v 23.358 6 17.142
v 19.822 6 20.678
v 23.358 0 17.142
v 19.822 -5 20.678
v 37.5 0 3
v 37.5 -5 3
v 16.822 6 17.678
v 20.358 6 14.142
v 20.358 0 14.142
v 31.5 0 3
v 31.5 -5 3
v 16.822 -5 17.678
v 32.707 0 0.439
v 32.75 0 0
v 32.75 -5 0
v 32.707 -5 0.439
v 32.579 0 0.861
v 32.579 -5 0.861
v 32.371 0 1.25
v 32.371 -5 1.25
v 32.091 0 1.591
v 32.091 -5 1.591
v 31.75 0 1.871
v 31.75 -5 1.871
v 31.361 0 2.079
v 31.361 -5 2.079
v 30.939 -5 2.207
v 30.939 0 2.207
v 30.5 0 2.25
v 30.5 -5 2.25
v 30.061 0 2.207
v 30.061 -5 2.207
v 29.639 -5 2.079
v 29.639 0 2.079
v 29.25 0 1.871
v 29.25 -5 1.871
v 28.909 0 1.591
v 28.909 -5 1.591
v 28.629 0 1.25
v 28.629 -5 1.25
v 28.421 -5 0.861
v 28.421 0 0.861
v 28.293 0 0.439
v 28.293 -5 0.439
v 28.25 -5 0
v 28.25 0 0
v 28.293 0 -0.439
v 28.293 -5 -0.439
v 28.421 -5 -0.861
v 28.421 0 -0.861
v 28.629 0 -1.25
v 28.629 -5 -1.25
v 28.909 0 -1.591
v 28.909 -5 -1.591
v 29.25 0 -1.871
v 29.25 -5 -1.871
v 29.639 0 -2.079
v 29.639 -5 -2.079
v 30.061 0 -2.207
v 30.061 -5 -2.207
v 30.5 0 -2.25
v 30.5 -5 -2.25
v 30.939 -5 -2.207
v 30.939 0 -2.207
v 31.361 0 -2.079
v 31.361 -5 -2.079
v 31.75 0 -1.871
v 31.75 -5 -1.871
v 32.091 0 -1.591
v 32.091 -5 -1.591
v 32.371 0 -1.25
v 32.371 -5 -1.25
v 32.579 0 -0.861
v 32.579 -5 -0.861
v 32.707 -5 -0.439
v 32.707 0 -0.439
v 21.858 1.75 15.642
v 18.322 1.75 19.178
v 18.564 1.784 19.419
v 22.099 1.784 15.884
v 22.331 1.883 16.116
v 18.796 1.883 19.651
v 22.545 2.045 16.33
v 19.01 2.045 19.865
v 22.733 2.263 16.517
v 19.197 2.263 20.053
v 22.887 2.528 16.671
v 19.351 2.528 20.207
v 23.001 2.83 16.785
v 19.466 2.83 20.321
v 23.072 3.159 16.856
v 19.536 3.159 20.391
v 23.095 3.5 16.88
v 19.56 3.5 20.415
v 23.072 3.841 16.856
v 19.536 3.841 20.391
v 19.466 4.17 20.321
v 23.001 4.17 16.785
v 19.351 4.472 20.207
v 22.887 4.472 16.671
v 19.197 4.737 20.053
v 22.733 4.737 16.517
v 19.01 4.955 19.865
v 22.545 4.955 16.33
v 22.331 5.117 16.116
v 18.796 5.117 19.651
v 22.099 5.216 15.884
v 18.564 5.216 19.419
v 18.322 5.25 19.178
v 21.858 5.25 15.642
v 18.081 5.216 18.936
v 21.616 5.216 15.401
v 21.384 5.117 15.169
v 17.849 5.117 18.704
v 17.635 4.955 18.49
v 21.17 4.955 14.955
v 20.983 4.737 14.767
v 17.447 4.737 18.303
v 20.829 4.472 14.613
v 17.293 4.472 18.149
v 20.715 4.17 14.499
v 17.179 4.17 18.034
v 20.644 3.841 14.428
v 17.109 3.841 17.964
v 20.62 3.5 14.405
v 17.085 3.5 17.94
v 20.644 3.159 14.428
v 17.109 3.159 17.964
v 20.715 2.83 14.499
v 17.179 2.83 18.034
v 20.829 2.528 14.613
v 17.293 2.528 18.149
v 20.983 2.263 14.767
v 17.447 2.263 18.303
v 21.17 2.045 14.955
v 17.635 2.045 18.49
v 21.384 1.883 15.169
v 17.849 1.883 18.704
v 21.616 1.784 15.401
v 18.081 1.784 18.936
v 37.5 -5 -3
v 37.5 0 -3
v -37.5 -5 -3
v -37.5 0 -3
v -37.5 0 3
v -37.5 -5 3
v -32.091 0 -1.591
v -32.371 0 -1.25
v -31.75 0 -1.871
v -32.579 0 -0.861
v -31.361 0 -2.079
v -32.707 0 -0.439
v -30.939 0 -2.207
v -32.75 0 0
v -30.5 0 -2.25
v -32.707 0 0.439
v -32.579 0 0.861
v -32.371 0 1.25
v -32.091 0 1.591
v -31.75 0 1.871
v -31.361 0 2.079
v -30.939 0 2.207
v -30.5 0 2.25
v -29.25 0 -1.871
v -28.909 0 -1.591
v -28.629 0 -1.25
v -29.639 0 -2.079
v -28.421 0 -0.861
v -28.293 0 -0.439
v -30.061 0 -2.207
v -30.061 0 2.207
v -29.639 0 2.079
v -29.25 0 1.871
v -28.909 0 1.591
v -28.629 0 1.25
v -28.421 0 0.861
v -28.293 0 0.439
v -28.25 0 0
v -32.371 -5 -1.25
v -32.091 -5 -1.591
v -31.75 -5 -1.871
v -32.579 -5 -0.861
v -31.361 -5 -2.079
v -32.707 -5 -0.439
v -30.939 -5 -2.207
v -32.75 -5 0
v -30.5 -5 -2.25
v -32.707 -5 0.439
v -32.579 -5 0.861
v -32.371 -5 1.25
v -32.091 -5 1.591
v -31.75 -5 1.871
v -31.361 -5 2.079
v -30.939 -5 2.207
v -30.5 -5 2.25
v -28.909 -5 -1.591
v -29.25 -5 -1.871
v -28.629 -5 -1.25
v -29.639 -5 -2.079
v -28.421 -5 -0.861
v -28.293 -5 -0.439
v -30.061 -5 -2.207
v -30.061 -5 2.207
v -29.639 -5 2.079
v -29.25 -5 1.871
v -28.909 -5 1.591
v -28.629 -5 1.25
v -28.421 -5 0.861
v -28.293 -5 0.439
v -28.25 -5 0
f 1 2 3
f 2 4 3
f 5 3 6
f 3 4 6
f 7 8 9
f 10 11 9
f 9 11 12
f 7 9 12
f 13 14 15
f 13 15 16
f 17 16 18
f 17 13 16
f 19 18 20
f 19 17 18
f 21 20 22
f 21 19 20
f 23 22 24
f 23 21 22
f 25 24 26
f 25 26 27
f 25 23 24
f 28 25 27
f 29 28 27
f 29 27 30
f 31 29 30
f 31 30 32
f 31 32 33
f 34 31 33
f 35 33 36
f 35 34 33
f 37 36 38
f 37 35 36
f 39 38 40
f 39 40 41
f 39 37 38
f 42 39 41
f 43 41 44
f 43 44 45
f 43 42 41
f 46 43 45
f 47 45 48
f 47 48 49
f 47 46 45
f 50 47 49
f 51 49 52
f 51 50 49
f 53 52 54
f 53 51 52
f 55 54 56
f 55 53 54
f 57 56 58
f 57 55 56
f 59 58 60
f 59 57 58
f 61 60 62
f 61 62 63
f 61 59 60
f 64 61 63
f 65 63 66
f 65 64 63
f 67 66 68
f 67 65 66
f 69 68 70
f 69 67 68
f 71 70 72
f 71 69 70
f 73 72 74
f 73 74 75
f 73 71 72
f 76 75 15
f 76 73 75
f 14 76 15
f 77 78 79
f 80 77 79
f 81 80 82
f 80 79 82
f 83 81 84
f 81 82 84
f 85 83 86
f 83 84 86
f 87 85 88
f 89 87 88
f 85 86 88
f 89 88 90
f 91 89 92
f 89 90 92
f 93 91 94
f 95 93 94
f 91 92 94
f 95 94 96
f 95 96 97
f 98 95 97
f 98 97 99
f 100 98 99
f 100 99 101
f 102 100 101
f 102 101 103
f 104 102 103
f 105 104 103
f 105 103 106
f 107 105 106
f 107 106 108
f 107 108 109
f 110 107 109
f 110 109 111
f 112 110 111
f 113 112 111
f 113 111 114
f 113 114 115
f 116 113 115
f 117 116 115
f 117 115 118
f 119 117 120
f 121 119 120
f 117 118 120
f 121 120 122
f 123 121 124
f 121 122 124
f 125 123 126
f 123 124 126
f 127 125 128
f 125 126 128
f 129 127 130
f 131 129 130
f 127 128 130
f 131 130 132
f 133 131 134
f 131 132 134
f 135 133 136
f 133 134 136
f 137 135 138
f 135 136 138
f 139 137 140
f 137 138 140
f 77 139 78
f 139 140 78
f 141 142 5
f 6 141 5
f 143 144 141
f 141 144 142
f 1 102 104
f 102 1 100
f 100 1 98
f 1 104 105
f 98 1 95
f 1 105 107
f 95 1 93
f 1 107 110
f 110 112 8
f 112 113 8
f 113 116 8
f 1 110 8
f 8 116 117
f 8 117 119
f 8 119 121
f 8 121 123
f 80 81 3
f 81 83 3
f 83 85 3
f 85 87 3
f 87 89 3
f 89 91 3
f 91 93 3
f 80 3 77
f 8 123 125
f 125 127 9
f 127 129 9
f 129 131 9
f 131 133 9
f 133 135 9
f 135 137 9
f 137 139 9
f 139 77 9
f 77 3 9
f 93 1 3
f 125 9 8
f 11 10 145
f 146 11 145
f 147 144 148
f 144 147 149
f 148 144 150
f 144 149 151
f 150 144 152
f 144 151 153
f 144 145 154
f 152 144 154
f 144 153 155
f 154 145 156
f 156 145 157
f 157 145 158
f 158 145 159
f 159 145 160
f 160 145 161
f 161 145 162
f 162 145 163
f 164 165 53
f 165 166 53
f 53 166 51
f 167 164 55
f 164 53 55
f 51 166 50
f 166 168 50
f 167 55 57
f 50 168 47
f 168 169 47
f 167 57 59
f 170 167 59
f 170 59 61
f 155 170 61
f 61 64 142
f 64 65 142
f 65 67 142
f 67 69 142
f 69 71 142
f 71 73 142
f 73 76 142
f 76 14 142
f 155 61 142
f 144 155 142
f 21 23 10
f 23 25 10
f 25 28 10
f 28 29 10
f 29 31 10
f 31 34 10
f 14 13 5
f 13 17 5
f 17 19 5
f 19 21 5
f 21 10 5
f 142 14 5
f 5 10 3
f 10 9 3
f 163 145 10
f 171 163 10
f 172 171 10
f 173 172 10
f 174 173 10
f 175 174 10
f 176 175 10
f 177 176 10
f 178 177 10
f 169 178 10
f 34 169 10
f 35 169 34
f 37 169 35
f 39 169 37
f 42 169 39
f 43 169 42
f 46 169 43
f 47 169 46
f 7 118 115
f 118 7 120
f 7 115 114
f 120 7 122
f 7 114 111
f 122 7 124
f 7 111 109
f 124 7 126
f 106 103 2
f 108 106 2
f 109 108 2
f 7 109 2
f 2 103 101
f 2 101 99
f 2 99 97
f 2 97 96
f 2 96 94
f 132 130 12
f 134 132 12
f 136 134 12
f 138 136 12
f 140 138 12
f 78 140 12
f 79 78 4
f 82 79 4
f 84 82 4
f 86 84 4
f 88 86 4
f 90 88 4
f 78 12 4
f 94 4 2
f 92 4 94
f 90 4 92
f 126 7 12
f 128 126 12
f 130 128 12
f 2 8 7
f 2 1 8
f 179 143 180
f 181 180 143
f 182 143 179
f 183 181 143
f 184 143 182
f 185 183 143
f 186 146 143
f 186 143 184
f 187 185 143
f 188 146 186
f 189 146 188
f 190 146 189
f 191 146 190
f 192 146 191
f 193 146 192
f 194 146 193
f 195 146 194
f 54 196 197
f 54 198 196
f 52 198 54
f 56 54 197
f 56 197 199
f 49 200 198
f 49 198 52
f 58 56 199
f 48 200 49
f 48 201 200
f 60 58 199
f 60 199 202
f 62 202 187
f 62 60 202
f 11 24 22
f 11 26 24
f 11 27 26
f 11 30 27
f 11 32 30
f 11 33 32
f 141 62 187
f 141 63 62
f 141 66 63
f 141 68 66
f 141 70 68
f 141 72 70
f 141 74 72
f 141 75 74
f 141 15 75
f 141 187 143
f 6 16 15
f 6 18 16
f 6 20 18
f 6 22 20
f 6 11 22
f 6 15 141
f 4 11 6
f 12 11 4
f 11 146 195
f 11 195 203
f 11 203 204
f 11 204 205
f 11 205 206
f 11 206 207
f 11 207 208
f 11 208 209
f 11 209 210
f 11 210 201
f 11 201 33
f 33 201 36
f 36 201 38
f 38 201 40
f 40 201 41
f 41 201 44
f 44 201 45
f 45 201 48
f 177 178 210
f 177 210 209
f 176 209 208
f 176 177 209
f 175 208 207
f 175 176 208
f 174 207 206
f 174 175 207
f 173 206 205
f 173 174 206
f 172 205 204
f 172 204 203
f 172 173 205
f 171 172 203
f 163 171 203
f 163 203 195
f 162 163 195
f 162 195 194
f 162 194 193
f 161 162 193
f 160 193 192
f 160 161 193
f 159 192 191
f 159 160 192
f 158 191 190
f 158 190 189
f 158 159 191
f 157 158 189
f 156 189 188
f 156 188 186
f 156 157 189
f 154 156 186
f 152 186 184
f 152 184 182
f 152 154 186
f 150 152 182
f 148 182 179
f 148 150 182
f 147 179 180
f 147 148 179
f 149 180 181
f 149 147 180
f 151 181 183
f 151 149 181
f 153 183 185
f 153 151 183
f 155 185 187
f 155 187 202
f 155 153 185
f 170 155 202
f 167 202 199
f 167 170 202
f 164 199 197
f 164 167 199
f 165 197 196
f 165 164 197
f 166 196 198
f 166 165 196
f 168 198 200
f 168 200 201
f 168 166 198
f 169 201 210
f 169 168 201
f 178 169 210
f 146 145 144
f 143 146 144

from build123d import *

# Parameters (mm, degrees)
F0_R     = 2.25
F1_DEPTH = 5
F3_DEPTH = 6
F4_R     = 1.75
F5_DEPTH = 29.243641


with BuildPart() as f1:
    # F0 (on Front) → F1 (new body)
    with BuildSketch(Plane.XZ):
        Polygon((37.5, -3), (37.5, 3), (31.5, 3), align=None)
        Polygon((31.5, 3), (37.5, 3), (19.82233, 20.67767), (16.82233, 17.67767), align=None)
        Polygon((37.5, -3), (31.5, 3), (-37.5, 3), (-37.5, -3), align=None)
        with Locations((-30.5, 0)):
            Circle(F0_R, mode=Mode.SUBTRACT)
        with Locations((30.5, 0)):
            Circle(F0_R, mode=Mode.SUBTRACT)
    extrude(amount=F1_DEPTH)

    # F2 (on face) → F3 (join)
    with BuildSketch(Plane(origin=(0, 0, 0), x_dir=(-1, 0, 0), z_dir=(0, 1, 0))):
        Polygon((-20.357864, 14.142136), (-16.82233, 17.67767), (-19.82233, 20.67767), (-23.357864, 17.142136), align=None)
    extrude(amount=F3_DEPTH)

    # F4 (on face) → F5 (cut, through all)
    with BuildSketch(Plane(origin=(-0.42767, 0, 0.42767), x_dir=(0, -1, 0), z_dir=(-0.707107, 0, 0.707107))):
        with Locations((-3.5, 26.516504)):
            Circle(F4_R)
    extrude(amount=-F5_DEPTH, mode=Mode.SUBTRACT)


solid = f1.part
